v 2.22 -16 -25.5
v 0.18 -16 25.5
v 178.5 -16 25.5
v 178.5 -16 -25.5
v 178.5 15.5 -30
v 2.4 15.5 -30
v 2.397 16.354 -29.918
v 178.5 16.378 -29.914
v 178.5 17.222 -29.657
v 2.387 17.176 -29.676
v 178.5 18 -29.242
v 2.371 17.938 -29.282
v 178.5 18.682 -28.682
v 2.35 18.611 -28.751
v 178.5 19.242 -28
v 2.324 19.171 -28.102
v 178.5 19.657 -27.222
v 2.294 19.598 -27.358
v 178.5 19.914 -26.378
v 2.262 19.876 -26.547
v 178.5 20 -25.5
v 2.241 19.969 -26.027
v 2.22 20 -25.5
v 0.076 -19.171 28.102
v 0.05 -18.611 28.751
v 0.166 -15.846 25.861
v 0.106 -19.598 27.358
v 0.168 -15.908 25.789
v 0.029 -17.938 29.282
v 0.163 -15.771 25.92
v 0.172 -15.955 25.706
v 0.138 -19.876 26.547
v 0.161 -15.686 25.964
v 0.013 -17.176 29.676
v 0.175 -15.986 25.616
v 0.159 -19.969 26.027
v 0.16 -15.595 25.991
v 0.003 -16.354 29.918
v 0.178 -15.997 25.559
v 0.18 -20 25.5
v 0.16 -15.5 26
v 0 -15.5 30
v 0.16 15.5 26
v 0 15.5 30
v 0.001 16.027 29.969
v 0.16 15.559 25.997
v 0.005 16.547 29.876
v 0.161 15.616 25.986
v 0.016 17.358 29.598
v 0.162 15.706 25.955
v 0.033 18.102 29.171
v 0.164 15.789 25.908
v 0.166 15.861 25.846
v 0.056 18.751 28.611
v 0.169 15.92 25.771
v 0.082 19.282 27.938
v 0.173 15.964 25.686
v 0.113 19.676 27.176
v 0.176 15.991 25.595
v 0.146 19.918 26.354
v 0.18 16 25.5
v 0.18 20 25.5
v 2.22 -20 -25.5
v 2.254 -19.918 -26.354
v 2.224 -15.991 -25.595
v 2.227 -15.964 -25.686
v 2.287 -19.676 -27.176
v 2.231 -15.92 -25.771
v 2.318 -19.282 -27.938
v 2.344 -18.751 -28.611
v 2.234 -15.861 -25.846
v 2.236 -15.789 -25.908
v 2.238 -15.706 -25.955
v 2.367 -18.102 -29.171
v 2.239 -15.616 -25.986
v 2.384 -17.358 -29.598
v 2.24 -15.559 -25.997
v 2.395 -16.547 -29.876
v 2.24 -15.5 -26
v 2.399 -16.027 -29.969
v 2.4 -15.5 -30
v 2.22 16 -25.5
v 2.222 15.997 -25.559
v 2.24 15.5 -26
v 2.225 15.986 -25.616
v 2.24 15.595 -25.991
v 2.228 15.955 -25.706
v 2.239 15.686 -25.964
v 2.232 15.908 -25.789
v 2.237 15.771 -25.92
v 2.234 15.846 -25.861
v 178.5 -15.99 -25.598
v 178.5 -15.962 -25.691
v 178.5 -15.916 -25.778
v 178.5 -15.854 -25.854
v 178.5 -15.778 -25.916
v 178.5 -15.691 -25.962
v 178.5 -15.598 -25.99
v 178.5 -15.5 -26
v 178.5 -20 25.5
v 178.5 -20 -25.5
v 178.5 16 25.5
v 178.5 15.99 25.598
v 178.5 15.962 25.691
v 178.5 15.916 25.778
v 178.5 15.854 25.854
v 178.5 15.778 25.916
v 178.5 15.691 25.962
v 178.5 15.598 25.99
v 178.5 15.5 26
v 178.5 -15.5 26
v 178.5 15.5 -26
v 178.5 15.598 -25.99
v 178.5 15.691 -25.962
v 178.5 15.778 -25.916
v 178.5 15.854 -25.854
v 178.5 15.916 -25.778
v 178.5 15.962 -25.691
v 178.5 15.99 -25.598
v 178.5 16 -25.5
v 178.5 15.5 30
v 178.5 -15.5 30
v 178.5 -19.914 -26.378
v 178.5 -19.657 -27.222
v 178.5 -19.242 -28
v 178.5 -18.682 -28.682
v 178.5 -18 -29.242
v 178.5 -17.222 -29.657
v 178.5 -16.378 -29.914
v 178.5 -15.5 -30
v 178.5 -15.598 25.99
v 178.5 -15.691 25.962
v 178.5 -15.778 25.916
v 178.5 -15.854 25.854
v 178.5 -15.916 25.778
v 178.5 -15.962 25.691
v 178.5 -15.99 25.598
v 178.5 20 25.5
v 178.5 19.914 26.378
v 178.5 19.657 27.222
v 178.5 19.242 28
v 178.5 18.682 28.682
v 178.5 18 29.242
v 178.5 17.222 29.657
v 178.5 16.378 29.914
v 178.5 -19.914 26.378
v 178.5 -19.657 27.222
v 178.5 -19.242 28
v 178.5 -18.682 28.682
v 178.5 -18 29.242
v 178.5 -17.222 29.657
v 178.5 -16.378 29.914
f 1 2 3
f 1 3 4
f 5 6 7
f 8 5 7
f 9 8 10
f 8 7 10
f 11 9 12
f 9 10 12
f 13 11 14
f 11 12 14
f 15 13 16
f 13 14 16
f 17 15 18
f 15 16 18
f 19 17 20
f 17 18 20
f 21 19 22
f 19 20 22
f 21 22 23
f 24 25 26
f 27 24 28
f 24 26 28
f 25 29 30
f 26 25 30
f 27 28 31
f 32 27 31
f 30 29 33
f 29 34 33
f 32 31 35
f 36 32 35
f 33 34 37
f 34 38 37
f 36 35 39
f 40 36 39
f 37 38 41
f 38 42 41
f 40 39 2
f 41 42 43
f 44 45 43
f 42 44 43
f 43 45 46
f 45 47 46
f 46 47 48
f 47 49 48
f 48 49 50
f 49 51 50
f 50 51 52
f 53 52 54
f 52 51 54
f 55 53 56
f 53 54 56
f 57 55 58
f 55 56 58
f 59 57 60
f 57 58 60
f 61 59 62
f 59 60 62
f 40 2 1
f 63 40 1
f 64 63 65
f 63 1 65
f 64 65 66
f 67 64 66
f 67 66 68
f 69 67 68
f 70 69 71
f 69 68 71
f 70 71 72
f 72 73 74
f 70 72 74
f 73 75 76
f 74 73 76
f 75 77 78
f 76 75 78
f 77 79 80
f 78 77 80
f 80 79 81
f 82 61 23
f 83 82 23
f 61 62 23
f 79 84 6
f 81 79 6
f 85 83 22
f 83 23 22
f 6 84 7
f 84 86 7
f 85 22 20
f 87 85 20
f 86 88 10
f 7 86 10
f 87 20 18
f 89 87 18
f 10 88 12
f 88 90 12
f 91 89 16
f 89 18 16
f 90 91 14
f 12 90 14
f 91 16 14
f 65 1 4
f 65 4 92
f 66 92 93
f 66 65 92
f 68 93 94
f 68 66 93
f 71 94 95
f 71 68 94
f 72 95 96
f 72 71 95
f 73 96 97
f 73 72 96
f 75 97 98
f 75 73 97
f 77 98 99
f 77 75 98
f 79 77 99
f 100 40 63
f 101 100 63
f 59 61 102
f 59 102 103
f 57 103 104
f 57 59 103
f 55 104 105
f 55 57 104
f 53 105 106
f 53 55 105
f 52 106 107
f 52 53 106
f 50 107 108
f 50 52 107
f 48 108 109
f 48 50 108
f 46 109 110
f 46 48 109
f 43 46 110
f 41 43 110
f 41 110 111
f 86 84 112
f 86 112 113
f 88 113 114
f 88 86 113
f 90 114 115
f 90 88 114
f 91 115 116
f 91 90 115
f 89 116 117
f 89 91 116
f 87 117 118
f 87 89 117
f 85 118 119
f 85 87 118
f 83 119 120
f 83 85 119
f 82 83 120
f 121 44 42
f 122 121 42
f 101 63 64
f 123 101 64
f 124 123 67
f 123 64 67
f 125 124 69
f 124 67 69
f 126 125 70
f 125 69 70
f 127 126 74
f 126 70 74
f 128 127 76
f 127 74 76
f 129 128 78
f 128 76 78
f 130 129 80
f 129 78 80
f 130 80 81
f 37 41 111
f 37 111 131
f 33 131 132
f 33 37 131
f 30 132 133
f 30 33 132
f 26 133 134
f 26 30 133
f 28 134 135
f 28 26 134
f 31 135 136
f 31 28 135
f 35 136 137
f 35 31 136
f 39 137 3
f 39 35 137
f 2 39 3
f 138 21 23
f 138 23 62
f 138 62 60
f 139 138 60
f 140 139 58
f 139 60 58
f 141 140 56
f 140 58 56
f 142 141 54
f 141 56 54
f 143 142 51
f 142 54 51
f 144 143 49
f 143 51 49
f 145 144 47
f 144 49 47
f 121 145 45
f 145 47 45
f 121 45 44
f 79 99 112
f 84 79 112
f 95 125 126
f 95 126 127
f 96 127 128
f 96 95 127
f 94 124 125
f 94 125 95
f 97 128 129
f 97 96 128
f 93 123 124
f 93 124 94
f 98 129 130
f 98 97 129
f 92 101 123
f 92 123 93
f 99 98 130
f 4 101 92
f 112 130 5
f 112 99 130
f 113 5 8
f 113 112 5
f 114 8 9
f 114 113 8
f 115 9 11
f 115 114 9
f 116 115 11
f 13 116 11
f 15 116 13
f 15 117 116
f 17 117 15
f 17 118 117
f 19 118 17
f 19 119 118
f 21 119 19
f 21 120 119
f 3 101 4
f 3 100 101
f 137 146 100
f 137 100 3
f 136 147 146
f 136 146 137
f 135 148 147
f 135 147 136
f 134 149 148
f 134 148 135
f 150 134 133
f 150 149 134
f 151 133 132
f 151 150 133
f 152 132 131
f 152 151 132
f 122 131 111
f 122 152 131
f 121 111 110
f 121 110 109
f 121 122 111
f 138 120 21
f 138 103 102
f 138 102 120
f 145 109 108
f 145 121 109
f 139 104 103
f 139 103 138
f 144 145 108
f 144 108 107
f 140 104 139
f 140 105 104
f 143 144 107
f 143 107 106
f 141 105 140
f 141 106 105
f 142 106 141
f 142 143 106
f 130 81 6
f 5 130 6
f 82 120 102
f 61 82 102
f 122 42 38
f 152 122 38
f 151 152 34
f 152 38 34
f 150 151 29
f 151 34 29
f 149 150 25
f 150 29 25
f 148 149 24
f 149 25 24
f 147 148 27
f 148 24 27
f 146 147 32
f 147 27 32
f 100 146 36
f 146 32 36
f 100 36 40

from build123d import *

# Parameters (mm, degrees)
TUBO_RECTANGULAR_60X40X4_DEPTH = 178.5
CORTAR_EXTRUIR1_DEPTH          = 186.370574795


with BuildPart() as part:
    # Sketch1 → Tubo rectangular 60X40X4 (new body)
    with BuildSketch(Plane.YZ):
        with BuildLine():
            Line((-15.5, -30), (15.5, -30))
            ThreePointArc((15.5, -30), (18.681980515, -28.681980515), (20, -25.5))
            Line((20, -25.5), (20, 25.5))
            ThreePointArc((20, 25.5), (18.681980515, 28.681980515), (15.5, 30))
            Line((15.5, 30), (-15.5, 30))
            ThreePointArc((-15.5, 30), (-18.681980515, 28.681980515), (-20, 25.5))
            Line((-20, 25.5), (-20, -25.5))
            ThreePointArc((-20, -25.5), (-18.681980515, -28.681980515), (-15.5, -30))
        make_face()
        with BuildLine():
            Line((-15.5, -26), (15.5, -26))
            ThreePointArc((15.5, -26), (15.853553391, -25.853553391), (16, -25.5))
            Line((16, -25.5), (16, 25.5))
            ThreePointArc((16, 25.5), (15.853553391, 25.853553391), (15.5, 26))
            Line((15.5, 26), (-15.5, 26))
            ThreePointArc((-15.5, 26), (-15.853553391, 25.853553391), (-16, 25.5))
            Line((-16, 25.5), (-16, -25.5))
            ThreePointArc((-16, -25.5), (-15.853553391, -25.853553391), (-15.5, -26))
        make_face(mode=Mode.SUBTRACT)
    extrude(amount=TUBO_RECTANGULAR_60X40X4_DEPTH)

    # Croquis4 → Cortar-Extruir1 (cut, through all)
    with BuildSketch(Plane(origin=(0, 20, 0), x_dir=(1, 0, 0), z_dir=(0, 1, 0))):
        Polygon((0, -30), (2.4, 30), (0, 30), align=None)
    extrude(amount=-CORTAR_EXTRUIR1_DEPTH, mode=Mode.SUBTRACT)


solid = part.part
